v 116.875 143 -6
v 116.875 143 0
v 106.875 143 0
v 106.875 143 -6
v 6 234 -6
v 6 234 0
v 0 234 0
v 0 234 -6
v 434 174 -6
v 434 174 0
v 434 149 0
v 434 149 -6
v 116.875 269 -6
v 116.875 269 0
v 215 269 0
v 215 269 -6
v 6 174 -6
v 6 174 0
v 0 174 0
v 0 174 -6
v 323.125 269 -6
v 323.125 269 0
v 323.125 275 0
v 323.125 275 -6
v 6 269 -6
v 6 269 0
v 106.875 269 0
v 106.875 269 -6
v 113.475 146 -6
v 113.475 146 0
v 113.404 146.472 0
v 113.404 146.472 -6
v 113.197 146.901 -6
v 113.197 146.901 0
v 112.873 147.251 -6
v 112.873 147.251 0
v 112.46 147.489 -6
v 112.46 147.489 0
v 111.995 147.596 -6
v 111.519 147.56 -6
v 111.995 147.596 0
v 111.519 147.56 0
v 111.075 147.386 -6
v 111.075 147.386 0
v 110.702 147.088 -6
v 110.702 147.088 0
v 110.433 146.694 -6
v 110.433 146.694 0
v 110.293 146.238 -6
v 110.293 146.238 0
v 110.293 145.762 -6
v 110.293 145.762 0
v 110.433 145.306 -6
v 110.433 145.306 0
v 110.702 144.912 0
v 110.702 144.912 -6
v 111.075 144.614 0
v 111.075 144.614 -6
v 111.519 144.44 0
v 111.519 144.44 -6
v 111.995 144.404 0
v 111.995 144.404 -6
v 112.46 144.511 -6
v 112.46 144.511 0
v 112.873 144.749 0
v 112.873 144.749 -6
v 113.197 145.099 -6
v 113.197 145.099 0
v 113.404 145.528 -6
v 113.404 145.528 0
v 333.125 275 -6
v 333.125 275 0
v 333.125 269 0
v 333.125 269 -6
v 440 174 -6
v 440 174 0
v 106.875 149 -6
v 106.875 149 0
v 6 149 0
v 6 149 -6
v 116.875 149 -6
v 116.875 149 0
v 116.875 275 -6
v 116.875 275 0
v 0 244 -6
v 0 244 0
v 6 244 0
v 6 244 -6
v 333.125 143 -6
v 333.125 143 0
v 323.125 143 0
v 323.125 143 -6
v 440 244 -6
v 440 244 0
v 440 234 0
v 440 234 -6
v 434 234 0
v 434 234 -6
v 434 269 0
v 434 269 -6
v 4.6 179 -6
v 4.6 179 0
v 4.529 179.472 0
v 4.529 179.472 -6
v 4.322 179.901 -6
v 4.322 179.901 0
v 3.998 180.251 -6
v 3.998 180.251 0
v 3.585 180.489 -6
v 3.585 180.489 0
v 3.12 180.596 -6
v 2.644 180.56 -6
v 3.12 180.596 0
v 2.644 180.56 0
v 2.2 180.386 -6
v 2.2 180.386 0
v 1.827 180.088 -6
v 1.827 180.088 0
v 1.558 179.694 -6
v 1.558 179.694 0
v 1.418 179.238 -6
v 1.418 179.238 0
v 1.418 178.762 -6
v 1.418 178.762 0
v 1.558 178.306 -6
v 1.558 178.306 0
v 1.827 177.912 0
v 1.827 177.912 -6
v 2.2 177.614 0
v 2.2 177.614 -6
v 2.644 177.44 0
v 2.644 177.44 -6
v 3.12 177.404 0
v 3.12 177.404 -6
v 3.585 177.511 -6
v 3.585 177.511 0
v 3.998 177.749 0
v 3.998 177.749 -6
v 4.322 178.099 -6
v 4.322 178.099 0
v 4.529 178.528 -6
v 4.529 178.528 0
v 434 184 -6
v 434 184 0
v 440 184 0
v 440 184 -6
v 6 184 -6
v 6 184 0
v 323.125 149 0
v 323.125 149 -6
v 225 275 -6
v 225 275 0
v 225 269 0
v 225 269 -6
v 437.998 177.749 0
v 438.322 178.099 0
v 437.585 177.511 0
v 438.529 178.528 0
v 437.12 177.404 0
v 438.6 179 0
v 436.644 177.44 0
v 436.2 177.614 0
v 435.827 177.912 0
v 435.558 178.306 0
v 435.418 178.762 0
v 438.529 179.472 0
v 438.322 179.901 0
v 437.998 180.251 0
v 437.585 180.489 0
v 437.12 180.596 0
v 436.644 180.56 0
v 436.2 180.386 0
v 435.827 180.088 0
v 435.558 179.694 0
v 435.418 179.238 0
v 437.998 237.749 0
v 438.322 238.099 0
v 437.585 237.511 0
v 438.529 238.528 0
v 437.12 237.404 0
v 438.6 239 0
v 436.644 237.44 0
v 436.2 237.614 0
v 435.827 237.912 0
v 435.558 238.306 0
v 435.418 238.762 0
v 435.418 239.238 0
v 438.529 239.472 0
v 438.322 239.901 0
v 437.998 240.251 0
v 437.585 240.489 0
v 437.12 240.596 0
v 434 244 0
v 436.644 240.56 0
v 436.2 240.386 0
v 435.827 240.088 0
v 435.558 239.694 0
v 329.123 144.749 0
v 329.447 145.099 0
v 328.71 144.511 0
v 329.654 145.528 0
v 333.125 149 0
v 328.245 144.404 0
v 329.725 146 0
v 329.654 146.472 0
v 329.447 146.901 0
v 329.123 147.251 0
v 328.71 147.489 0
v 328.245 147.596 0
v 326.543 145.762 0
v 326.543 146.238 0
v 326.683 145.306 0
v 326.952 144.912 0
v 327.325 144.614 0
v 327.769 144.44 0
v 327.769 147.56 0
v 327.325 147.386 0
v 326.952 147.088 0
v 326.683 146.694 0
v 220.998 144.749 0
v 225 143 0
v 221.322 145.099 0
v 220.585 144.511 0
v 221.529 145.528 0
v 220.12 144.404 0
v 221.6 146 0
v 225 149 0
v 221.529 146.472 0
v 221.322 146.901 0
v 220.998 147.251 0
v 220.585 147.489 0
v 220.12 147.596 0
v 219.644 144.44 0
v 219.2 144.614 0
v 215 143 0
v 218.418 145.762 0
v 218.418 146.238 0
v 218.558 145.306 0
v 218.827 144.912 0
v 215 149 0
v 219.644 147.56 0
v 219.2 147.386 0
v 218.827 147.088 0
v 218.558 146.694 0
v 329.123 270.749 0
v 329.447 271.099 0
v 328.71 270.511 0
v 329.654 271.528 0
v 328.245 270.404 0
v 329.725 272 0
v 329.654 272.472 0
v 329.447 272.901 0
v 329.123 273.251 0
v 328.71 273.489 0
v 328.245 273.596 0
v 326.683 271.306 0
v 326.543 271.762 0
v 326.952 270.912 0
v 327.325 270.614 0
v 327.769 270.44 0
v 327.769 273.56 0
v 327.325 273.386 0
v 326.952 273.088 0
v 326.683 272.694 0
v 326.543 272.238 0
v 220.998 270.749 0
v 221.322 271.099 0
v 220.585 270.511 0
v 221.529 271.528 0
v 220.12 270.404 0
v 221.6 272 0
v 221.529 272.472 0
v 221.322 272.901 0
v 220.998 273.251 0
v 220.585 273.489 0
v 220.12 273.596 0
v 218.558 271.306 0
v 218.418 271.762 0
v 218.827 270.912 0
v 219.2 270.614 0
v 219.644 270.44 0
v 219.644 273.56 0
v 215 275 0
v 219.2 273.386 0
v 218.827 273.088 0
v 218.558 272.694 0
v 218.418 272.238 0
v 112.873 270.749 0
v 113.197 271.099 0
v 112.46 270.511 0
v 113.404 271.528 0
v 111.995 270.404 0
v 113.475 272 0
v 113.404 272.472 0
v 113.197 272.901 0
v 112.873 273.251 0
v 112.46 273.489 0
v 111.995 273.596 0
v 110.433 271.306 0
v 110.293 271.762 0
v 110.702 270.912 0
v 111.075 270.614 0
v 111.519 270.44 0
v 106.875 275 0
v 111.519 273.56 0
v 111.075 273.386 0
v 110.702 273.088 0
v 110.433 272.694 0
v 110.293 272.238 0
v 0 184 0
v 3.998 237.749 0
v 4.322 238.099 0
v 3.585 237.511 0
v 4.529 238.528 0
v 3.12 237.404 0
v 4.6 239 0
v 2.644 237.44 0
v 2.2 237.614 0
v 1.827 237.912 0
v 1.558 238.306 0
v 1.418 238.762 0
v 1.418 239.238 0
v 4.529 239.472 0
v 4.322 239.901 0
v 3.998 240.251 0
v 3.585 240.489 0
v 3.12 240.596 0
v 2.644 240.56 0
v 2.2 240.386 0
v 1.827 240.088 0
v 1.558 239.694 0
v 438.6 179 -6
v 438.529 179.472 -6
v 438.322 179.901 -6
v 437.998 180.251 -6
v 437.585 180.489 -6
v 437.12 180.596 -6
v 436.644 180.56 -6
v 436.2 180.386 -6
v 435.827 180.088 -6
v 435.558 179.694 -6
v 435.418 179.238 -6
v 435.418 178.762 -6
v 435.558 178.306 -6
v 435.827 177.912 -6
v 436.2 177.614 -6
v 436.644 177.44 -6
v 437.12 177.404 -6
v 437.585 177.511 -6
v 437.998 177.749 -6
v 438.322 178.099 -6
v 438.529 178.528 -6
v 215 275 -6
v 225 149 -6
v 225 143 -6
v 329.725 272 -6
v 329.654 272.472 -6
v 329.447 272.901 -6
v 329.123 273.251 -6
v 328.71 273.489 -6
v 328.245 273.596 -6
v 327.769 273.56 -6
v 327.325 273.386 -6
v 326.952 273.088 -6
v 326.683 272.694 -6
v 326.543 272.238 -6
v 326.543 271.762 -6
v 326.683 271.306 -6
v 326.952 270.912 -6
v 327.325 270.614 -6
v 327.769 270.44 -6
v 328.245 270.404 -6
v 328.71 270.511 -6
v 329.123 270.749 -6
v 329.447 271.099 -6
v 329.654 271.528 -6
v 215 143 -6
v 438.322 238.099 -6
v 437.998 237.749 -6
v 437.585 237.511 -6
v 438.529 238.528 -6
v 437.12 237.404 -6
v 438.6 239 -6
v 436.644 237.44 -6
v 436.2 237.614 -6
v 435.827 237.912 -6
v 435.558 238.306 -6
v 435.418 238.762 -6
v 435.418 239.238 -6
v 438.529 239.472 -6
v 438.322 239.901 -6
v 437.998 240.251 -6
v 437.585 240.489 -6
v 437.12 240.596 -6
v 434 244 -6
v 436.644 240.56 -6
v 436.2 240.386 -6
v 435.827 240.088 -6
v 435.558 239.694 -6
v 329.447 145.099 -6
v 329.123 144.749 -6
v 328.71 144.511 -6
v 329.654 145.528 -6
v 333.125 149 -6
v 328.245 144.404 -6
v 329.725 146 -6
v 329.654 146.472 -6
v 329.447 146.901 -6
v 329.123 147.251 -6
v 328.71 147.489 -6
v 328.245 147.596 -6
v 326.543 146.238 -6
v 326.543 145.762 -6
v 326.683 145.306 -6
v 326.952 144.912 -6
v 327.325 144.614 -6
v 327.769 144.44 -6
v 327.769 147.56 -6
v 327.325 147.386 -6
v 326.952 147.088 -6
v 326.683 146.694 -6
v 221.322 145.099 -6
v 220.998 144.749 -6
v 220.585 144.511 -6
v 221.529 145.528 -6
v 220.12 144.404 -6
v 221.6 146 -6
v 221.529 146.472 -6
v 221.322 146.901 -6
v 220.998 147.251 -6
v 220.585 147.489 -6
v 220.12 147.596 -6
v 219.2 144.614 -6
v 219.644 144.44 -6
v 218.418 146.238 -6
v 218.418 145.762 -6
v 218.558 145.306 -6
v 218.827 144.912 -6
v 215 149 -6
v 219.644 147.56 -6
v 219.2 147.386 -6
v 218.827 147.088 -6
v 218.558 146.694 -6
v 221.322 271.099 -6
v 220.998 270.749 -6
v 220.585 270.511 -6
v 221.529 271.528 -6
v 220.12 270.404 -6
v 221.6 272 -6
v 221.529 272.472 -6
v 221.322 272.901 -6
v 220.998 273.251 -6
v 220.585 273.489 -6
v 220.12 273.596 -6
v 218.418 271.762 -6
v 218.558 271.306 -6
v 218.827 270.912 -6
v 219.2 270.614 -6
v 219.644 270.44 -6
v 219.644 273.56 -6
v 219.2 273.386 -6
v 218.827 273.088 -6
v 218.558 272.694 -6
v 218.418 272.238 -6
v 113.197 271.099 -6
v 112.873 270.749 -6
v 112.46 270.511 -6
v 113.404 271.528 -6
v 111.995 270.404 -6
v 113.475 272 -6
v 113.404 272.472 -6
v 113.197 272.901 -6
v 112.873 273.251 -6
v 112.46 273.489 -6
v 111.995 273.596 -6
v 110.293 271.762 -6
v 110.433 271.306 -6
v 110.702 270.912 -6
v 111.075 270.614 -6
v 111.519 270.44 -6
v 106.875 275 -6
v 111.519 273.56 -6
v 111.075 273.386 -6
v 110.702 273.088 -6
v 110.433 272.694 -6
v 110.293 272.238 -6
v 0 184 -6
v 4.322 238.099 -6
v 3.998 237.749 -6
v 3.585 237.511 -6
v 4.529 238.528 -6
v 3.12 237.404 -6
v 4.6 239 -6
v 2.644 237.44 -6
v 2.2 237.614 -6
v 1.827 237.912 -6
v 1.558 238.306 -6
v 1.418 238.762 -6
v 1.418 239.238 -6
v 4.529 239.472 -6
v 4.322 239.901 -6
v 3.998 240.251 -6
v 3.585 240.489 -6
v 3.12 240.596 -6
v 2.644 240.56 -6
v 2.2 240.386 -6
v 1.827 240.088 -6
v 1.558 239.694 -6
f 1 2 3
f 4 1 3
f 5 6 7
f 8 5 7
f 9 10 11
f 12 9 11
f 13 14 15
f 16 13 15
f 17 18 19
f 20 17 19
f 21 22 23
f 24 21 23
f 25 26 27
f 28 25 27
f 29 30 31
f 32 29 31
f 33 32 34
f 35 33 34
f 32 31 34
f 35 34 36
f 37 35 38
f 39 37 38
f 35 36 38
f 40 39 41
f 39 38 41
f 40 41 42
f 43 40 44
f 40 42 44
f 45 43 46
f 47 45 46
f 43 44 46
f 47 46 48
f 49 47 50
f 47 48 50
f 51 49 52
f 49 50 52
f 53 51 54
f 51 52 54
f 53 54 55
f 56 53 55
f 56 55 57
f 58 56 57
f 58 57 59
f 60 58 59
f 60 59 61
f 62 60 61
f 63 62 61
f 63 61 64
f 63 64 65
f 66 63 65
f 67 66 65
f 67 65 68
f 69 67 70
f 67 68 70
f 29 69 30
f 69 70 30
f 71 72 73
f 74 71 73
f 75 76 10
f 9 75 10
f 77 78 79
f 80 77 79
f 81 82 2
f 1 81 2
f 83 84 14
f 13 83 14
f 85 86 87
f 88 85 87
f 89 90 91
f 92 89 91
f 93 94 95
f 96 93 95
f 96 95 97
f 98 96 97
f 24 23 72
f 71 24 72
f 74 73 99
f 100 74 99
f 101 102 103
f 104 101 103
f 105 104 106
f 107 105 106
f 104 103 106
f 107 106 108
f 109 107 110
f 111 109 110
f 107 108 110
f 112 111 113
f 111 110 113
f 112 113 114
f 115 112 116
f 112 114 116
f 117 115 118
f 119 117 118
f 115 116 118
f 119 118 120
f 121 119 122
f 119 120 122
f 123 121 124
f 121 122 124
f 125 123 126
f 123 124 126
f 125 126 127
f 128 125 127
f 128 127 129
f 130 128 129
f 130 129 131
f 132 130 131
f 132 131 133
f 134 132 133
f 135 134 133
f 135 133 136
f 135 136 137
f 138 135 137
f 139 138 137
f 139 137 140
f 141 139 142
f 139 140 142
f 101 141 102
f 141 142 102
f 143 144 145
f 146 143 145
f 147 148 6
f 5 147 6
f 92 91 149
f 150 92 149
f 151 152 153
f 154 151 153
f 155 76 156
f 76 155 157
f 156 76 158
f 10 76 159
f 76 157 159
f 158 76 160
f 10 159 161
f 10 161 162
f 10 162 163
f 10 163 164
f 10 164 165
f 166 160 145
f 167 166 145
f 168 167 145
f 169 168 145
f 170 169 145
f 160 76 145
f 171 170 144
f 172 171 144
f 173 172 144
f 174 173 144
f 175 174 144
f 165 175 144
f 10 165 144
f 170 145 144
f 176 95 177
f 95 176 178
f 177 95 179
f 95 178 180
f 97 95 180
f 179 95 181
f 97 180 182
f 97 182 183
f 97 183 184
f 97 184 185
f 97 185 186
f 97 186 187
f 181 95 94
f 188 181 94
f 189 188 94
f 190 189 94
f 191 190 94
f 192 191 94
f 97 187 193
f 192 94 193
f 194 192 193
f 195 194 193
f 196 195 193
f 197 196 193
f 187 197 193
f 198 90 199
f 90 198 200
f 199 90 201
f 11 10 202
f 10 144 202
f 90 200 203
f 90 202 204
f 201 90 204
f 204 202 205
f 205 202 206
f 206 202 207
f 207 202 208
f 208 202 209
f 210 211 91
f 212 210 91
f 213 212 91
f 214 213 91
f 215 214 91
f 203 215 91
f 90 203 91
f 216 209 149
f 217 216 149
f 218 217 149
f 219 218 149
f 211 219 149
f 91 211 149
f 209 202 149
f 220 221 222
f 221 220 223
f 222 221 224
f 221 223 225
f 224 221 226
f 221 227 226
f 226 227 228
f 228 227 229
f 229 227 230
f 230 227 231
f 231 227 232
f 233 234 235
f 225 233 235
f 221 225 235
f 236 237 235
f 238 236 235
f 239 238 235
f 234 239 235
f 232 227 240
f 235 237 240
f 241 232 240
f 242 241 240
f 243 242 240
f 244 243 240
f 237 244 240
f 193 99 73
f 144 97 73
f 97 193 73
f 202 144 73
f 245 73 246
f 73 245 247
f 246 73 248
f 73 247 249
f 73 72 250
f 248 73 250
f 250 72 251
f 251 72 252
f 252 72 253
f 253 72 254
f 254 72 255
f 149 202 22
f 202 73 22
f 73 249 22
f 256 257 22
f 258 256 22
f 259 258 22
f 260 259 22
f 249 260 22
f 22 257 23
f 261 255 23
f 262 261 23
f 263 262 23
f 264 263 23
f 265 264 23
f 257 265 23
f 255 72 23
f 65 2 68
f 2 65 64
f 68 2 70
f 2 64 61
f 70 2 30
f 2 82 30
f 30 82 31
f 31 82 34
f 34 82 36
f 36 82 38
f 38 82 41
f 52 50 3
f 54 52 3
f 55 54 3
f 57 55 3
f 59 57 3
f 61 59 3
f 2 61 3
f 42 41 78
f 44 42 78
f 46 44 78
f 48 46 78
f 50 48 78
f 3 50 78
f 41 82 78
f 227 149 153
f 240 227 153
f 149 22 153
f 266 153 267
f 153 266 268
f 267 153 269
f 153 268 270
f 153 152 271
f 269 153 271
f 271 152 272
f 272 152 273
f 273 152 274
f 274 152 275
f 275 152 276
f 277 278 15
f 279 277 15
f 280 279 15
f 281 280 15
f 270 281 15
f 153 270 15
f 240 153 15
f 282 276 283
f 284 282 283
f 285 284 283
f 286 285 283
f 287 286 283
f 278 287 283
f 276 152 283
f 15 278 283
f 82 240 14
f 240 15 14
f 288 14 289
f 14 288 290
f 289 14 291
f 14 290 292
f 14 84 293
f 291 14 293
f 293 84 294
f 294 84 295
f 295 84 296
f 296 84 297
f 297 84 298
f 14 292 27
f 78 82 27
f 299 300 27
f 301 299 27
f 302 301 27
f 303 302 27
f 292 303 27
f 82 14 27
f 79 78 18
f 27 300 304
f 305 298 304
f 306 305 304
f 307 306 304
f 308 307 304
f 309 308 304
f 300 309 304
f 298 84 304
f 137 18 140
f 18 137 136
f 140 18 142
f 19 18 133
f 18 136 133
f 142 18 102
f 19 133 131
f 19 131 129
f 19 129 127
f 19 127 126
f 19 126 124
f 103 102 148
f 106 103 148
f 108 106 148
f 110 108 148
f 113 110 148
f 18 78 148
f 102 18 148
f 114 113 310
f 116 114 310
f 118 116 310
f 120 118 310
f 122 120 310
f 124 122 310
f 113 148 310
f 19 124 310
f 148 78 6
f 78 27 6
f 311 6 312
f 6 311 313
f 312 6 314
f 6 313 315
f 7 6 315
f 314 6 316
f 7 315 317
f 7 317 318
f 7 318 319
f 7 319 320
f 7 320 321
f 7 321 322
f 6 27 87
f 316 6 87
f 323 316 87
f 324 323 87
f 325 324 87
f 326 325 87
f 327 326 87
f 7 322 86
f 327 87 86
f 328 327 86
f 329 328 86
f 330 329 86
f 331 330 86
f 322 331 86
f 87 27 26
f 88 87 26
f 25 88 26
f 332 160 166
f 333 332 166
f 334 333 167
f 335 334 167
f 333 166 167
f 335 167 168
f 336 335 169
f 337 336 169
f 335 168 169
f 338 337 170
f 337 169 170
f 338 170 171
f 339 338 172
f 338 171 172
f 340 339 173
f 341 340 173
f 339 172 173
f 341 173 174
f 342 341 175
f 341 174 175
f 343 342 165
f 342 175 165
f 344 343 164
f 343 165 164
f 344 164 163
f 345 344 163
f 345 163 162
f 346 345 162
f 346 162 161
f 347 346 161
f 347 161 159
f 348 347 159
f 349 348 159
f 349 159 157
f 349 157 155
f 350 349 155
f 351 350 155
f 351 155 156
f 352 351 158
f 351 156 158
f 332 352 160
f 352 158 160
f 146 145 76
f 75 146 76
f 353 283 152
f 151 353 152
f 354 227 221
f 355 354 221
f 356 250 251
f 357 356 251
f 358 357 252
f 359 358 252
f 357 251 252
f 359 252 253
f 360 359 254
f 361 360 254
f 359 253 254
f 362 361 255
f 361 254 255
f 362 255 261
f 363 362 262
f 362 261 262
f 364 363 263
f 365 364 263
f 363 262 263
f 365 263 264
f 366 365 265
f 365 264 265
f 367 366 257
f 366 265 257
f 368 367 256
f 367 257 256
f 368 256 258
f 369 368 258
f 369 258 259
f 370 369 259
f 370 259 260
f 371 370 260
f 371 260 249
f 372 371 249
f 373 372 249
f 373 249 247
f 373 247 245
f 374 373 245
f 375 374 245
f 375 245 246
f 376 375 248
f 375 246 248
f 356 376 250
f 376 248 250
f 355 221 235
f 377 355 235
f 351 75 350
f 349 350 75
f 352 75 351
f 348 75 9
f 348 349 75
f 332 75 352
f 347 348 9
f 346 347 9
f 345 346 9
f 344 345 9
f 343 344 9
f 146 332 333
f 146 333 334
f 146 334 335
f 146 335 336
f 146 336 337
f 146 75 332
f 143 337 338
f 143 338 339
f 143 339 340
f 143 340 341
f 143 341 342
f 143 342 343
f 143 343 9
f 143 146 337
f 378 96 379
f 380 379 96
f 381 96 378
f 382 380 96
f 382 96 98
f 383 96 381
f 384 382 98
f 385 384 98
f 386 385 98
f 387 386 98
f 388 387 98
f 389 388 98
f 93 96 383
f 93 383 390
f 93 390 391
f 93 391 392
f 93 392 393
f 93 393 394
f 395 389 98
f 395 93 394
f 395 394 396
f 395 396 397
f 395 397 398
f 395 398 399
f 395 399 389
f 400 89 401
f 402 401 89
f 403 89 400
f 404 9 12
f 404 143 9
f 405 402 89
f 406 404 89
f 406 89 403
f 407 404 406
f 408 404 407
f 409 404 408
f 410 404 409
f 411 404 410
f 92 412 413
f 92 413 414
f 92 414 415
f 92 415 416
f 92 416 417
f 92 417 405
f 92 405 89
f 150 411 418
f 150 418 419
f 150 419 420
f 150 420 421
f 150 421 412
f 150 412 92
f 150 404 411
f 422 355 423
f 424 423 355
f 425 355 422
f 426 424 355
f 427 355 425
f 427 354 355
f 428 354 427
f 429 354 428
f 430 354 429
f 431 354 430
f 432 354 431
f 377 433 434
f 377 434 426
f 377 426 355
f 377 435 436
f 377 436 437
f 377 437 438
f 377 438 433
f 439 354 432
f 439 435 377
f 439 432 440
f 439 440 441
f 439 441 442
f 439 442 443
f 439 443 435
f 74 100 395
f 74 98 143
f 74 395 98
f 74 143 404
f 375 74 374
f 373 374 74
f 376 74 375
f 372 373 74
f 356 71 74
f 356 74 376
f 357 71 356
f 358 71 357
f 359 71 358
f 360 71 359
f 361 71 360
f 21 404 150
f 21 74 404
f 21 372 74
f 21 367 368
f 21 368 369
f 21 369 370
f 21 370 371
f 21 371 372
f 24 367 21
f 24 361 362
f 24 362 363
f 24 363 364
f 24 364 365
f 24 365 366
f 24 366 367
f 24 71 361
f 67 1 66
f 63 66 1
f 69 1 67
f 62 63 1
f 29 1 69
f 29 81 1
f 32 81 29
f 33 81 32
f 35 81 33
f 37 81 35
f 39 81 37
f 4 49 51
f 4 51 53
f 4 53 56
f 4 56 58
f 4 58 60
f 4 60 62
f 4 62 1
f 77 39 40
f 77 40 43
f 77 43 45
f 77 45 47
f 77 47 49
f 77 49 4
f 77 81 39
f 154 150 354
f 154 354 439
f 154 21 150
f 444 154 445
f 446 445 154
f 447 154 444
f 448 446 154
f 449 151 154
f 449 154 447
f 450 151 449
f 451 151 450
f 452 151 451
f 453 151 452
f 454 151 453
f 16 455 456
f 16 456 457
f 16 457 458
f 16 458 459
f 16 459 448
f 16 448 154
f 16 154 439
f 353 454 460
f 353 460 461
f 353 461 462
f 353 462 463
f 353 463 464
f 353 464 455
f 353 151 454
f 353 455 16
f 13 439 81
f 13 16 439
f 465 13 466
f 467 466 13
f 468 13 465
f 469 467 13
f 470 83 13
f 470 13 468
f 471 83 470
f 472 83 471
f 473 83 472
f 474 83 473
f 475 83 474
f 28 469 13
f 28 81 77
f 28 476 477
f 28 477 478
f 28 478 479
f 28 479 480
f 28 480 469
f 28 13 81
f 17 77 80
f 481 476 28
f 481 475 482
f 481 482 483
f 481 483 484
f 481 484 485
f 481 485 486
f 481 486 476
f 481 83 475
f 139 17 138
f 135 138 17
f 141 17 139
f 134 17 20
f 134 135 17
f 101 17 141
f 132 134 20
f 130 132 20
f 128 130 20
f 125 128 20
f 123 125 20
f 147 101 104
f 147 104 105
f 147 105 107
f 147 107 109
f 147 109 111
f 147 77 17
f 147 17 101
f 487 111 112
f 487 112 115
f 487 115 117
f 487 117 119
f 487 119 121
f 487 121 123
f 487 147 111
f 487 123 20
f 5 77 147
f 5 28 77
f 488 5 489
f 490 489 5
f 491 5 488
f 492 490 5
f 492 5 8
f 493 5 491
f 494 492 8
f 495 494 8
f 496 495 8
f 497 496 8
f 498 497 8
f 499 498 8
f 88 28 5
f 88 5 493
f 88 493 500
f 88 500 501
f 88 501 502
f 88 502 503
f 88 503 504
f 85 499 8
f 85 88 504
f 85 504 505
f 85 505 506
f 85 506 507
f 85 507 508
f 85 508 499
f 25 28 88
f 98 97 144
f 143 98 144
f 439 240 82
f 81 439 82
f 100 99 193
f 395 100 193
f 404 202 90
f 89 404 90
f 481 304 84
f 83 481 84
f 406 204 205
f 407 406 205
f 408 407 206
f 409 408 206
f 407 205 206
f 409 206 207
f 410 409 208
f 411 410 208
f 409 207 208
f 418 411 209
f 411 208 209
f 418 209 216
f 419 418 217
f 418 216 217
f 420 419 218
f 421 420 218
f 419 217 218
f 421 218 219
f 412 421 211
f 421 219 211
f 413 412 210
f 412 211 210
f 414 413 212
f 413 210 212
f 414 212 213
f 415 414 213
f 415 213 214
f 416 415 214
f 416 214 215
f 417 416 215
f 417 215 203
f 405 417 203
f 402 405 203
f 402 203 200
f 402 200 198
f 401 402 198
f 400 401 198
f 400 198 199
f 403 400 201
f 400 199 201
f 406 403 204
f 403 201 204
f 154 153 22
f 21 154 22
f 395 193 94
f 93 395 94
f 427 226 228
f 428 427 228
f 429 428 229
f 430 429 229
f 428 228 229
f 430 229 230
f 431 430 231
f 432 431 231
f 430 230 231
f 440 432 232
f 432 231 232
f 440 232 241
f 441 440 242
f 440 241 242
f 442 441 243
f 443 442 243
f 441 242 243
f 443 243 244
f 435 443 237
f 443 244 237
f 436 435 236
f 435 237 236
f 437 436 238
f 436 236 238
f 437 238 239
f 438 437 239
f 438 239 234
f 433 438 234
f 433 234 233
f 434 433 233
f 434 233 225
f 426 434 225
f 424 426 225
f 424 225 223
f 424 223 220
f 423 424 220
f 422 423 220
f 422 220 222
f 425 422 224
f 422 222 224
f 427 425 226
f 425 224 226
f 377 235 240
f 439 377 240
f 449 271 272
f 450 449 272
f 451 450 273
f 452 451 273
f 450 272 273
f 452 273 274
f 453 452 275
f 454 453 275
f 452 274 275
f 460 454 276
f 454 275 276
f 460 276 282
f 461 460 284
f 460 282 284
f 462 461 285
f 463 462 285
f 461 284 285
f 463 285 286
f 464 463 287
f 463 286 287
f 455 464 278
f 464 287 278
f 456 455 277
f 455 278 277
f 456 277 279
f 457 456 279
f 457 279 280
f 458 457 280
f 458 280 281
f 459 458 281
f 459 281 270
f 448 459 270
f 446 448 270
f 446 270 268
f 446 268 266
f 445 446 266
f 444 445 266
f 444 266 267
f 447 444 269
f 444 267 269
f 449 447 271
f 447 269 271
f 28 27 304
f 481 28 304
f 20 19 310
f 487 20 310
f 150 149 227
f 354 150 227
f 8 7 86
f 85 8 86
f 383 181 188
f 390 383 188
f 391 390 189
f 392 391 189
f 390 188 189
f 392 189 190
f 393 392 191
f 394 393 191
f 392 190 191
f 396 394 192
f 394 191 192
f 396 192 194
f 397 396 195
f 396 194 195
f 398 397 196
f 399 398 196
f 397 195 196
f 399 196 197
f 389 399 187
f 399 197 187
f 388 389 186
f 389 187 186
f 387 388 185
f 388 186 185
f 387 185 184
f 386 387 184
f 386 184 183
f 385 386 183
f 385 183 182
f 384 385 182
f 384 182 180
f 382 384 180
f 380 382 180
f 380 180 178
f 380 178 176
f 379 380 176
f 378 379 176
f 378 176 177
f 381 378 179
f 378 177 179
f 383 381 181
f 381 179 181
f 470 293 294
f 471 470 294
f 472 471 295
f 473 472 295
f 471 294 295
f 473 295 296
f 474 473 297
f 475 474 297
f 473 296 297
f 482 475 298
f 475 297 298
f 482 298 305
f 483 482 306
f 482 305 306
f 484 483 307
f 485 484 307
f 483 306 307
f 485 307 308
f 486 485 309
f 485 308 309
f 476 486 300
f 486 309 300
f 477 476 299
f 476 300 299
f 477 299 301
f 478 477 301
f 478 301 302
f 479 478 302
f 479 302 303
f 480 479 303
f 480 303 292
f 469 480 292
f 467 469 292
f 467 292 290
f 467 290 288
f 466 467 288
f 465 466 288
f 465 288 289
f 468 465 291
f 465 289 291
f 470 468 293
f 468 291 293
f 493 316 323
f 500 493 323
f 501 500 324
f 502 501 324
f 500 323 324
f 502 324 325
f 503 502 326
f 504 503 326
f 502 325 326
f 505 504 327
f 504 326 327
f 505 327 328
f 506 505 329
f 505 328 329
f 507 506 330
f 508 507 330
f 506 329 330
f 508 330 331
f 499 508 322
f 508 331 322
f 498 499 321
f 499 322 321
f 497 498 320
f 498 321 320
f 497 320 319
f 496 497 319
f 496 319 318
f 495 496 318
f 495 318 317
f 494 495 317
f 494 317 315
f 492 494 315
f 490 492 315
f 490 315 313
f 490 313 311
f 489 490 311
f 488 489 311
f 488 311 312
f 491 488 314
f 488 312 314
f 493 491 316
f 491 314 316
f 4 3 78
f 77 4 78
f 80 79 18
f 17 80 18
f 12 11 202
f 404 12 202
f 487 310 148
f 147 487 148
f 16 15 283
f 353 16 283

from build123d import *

# Parameters (mm, degrees)
SKETCH1_R           = 1.6
BOSS_EXTRUDE1_DEPTH = 6


with BuildPart() as part:
    # Sketch1 → Boss-Extrude1 (new body)
    with BuildSketch(Plane.XY):
        Polygon((6, 269), (106.875, 269), (106.875, 275), (116.875, 275), (116.875, 269), (215, 269), (215, 275), (225, 275), (225, 269), (323.125, 269), (323.125, 275), (333.125, 275), (333.125, 269), (434, 269), (434, 244), (440, 244), (440, 234), (434, 234), (434, 184), (440, 184), (440, 174), (434, 174), (434, 149), (333.125, 149), (333.125, 143), (323.125, 143), (323.125, 149), (225, 149), (225, 143), (215, 143), (215, 149), (116.875, 149), (116.875, 143), (106.875, 143), (106.875, 149), (6, 149), (6, 174), (0, 174), (0, 184), (6, 184), (6, 234), (0, 234), (0, 244), (6, 244), align=None)
        with Locations((111.875, 146)):
            Circle(SKETCH1_R, mode=Mode.SUBTRACT)
        with Locations((220, 146)):
            Circle(SKETCH1_R, mode=Mode.SUBTRACT)
        with Locations((328.125, 146)):
            Circle(SKETCH1_R, mode=Mode.SUBTRACT)
        with Locations((328.125, 272)):
            Circle(SKETCH1_R, mode=Mode.SUBTRACT)
        with Locations((220, 272)):
            Circle(SKETCH1_R, mode=Mode.SUBTRACT)
        with Locations((111.875, 272)):
            Circle(SKETCH1_R, mode=Mode.SUBTRACT)
        with Locations((3, 239)):
            Circle(SKETCH1_R, mode=Mode.SUBTRACT)
        with Locations((3, 179)):
            Circle(SKETCH1_R, mode=Mode.SUBTRACT)
        with Locations((437, 239)):
            Circle(SKETCH1_R, mode=Mode.SUBTRACT)
        with Locations((437, 179)):
            Circle(SKETCH1_R, mode=Mode.SUBTRACT)
    extrude(amount=-BOSS_EXTRUDE1_DEPTH)


solid = part.part
